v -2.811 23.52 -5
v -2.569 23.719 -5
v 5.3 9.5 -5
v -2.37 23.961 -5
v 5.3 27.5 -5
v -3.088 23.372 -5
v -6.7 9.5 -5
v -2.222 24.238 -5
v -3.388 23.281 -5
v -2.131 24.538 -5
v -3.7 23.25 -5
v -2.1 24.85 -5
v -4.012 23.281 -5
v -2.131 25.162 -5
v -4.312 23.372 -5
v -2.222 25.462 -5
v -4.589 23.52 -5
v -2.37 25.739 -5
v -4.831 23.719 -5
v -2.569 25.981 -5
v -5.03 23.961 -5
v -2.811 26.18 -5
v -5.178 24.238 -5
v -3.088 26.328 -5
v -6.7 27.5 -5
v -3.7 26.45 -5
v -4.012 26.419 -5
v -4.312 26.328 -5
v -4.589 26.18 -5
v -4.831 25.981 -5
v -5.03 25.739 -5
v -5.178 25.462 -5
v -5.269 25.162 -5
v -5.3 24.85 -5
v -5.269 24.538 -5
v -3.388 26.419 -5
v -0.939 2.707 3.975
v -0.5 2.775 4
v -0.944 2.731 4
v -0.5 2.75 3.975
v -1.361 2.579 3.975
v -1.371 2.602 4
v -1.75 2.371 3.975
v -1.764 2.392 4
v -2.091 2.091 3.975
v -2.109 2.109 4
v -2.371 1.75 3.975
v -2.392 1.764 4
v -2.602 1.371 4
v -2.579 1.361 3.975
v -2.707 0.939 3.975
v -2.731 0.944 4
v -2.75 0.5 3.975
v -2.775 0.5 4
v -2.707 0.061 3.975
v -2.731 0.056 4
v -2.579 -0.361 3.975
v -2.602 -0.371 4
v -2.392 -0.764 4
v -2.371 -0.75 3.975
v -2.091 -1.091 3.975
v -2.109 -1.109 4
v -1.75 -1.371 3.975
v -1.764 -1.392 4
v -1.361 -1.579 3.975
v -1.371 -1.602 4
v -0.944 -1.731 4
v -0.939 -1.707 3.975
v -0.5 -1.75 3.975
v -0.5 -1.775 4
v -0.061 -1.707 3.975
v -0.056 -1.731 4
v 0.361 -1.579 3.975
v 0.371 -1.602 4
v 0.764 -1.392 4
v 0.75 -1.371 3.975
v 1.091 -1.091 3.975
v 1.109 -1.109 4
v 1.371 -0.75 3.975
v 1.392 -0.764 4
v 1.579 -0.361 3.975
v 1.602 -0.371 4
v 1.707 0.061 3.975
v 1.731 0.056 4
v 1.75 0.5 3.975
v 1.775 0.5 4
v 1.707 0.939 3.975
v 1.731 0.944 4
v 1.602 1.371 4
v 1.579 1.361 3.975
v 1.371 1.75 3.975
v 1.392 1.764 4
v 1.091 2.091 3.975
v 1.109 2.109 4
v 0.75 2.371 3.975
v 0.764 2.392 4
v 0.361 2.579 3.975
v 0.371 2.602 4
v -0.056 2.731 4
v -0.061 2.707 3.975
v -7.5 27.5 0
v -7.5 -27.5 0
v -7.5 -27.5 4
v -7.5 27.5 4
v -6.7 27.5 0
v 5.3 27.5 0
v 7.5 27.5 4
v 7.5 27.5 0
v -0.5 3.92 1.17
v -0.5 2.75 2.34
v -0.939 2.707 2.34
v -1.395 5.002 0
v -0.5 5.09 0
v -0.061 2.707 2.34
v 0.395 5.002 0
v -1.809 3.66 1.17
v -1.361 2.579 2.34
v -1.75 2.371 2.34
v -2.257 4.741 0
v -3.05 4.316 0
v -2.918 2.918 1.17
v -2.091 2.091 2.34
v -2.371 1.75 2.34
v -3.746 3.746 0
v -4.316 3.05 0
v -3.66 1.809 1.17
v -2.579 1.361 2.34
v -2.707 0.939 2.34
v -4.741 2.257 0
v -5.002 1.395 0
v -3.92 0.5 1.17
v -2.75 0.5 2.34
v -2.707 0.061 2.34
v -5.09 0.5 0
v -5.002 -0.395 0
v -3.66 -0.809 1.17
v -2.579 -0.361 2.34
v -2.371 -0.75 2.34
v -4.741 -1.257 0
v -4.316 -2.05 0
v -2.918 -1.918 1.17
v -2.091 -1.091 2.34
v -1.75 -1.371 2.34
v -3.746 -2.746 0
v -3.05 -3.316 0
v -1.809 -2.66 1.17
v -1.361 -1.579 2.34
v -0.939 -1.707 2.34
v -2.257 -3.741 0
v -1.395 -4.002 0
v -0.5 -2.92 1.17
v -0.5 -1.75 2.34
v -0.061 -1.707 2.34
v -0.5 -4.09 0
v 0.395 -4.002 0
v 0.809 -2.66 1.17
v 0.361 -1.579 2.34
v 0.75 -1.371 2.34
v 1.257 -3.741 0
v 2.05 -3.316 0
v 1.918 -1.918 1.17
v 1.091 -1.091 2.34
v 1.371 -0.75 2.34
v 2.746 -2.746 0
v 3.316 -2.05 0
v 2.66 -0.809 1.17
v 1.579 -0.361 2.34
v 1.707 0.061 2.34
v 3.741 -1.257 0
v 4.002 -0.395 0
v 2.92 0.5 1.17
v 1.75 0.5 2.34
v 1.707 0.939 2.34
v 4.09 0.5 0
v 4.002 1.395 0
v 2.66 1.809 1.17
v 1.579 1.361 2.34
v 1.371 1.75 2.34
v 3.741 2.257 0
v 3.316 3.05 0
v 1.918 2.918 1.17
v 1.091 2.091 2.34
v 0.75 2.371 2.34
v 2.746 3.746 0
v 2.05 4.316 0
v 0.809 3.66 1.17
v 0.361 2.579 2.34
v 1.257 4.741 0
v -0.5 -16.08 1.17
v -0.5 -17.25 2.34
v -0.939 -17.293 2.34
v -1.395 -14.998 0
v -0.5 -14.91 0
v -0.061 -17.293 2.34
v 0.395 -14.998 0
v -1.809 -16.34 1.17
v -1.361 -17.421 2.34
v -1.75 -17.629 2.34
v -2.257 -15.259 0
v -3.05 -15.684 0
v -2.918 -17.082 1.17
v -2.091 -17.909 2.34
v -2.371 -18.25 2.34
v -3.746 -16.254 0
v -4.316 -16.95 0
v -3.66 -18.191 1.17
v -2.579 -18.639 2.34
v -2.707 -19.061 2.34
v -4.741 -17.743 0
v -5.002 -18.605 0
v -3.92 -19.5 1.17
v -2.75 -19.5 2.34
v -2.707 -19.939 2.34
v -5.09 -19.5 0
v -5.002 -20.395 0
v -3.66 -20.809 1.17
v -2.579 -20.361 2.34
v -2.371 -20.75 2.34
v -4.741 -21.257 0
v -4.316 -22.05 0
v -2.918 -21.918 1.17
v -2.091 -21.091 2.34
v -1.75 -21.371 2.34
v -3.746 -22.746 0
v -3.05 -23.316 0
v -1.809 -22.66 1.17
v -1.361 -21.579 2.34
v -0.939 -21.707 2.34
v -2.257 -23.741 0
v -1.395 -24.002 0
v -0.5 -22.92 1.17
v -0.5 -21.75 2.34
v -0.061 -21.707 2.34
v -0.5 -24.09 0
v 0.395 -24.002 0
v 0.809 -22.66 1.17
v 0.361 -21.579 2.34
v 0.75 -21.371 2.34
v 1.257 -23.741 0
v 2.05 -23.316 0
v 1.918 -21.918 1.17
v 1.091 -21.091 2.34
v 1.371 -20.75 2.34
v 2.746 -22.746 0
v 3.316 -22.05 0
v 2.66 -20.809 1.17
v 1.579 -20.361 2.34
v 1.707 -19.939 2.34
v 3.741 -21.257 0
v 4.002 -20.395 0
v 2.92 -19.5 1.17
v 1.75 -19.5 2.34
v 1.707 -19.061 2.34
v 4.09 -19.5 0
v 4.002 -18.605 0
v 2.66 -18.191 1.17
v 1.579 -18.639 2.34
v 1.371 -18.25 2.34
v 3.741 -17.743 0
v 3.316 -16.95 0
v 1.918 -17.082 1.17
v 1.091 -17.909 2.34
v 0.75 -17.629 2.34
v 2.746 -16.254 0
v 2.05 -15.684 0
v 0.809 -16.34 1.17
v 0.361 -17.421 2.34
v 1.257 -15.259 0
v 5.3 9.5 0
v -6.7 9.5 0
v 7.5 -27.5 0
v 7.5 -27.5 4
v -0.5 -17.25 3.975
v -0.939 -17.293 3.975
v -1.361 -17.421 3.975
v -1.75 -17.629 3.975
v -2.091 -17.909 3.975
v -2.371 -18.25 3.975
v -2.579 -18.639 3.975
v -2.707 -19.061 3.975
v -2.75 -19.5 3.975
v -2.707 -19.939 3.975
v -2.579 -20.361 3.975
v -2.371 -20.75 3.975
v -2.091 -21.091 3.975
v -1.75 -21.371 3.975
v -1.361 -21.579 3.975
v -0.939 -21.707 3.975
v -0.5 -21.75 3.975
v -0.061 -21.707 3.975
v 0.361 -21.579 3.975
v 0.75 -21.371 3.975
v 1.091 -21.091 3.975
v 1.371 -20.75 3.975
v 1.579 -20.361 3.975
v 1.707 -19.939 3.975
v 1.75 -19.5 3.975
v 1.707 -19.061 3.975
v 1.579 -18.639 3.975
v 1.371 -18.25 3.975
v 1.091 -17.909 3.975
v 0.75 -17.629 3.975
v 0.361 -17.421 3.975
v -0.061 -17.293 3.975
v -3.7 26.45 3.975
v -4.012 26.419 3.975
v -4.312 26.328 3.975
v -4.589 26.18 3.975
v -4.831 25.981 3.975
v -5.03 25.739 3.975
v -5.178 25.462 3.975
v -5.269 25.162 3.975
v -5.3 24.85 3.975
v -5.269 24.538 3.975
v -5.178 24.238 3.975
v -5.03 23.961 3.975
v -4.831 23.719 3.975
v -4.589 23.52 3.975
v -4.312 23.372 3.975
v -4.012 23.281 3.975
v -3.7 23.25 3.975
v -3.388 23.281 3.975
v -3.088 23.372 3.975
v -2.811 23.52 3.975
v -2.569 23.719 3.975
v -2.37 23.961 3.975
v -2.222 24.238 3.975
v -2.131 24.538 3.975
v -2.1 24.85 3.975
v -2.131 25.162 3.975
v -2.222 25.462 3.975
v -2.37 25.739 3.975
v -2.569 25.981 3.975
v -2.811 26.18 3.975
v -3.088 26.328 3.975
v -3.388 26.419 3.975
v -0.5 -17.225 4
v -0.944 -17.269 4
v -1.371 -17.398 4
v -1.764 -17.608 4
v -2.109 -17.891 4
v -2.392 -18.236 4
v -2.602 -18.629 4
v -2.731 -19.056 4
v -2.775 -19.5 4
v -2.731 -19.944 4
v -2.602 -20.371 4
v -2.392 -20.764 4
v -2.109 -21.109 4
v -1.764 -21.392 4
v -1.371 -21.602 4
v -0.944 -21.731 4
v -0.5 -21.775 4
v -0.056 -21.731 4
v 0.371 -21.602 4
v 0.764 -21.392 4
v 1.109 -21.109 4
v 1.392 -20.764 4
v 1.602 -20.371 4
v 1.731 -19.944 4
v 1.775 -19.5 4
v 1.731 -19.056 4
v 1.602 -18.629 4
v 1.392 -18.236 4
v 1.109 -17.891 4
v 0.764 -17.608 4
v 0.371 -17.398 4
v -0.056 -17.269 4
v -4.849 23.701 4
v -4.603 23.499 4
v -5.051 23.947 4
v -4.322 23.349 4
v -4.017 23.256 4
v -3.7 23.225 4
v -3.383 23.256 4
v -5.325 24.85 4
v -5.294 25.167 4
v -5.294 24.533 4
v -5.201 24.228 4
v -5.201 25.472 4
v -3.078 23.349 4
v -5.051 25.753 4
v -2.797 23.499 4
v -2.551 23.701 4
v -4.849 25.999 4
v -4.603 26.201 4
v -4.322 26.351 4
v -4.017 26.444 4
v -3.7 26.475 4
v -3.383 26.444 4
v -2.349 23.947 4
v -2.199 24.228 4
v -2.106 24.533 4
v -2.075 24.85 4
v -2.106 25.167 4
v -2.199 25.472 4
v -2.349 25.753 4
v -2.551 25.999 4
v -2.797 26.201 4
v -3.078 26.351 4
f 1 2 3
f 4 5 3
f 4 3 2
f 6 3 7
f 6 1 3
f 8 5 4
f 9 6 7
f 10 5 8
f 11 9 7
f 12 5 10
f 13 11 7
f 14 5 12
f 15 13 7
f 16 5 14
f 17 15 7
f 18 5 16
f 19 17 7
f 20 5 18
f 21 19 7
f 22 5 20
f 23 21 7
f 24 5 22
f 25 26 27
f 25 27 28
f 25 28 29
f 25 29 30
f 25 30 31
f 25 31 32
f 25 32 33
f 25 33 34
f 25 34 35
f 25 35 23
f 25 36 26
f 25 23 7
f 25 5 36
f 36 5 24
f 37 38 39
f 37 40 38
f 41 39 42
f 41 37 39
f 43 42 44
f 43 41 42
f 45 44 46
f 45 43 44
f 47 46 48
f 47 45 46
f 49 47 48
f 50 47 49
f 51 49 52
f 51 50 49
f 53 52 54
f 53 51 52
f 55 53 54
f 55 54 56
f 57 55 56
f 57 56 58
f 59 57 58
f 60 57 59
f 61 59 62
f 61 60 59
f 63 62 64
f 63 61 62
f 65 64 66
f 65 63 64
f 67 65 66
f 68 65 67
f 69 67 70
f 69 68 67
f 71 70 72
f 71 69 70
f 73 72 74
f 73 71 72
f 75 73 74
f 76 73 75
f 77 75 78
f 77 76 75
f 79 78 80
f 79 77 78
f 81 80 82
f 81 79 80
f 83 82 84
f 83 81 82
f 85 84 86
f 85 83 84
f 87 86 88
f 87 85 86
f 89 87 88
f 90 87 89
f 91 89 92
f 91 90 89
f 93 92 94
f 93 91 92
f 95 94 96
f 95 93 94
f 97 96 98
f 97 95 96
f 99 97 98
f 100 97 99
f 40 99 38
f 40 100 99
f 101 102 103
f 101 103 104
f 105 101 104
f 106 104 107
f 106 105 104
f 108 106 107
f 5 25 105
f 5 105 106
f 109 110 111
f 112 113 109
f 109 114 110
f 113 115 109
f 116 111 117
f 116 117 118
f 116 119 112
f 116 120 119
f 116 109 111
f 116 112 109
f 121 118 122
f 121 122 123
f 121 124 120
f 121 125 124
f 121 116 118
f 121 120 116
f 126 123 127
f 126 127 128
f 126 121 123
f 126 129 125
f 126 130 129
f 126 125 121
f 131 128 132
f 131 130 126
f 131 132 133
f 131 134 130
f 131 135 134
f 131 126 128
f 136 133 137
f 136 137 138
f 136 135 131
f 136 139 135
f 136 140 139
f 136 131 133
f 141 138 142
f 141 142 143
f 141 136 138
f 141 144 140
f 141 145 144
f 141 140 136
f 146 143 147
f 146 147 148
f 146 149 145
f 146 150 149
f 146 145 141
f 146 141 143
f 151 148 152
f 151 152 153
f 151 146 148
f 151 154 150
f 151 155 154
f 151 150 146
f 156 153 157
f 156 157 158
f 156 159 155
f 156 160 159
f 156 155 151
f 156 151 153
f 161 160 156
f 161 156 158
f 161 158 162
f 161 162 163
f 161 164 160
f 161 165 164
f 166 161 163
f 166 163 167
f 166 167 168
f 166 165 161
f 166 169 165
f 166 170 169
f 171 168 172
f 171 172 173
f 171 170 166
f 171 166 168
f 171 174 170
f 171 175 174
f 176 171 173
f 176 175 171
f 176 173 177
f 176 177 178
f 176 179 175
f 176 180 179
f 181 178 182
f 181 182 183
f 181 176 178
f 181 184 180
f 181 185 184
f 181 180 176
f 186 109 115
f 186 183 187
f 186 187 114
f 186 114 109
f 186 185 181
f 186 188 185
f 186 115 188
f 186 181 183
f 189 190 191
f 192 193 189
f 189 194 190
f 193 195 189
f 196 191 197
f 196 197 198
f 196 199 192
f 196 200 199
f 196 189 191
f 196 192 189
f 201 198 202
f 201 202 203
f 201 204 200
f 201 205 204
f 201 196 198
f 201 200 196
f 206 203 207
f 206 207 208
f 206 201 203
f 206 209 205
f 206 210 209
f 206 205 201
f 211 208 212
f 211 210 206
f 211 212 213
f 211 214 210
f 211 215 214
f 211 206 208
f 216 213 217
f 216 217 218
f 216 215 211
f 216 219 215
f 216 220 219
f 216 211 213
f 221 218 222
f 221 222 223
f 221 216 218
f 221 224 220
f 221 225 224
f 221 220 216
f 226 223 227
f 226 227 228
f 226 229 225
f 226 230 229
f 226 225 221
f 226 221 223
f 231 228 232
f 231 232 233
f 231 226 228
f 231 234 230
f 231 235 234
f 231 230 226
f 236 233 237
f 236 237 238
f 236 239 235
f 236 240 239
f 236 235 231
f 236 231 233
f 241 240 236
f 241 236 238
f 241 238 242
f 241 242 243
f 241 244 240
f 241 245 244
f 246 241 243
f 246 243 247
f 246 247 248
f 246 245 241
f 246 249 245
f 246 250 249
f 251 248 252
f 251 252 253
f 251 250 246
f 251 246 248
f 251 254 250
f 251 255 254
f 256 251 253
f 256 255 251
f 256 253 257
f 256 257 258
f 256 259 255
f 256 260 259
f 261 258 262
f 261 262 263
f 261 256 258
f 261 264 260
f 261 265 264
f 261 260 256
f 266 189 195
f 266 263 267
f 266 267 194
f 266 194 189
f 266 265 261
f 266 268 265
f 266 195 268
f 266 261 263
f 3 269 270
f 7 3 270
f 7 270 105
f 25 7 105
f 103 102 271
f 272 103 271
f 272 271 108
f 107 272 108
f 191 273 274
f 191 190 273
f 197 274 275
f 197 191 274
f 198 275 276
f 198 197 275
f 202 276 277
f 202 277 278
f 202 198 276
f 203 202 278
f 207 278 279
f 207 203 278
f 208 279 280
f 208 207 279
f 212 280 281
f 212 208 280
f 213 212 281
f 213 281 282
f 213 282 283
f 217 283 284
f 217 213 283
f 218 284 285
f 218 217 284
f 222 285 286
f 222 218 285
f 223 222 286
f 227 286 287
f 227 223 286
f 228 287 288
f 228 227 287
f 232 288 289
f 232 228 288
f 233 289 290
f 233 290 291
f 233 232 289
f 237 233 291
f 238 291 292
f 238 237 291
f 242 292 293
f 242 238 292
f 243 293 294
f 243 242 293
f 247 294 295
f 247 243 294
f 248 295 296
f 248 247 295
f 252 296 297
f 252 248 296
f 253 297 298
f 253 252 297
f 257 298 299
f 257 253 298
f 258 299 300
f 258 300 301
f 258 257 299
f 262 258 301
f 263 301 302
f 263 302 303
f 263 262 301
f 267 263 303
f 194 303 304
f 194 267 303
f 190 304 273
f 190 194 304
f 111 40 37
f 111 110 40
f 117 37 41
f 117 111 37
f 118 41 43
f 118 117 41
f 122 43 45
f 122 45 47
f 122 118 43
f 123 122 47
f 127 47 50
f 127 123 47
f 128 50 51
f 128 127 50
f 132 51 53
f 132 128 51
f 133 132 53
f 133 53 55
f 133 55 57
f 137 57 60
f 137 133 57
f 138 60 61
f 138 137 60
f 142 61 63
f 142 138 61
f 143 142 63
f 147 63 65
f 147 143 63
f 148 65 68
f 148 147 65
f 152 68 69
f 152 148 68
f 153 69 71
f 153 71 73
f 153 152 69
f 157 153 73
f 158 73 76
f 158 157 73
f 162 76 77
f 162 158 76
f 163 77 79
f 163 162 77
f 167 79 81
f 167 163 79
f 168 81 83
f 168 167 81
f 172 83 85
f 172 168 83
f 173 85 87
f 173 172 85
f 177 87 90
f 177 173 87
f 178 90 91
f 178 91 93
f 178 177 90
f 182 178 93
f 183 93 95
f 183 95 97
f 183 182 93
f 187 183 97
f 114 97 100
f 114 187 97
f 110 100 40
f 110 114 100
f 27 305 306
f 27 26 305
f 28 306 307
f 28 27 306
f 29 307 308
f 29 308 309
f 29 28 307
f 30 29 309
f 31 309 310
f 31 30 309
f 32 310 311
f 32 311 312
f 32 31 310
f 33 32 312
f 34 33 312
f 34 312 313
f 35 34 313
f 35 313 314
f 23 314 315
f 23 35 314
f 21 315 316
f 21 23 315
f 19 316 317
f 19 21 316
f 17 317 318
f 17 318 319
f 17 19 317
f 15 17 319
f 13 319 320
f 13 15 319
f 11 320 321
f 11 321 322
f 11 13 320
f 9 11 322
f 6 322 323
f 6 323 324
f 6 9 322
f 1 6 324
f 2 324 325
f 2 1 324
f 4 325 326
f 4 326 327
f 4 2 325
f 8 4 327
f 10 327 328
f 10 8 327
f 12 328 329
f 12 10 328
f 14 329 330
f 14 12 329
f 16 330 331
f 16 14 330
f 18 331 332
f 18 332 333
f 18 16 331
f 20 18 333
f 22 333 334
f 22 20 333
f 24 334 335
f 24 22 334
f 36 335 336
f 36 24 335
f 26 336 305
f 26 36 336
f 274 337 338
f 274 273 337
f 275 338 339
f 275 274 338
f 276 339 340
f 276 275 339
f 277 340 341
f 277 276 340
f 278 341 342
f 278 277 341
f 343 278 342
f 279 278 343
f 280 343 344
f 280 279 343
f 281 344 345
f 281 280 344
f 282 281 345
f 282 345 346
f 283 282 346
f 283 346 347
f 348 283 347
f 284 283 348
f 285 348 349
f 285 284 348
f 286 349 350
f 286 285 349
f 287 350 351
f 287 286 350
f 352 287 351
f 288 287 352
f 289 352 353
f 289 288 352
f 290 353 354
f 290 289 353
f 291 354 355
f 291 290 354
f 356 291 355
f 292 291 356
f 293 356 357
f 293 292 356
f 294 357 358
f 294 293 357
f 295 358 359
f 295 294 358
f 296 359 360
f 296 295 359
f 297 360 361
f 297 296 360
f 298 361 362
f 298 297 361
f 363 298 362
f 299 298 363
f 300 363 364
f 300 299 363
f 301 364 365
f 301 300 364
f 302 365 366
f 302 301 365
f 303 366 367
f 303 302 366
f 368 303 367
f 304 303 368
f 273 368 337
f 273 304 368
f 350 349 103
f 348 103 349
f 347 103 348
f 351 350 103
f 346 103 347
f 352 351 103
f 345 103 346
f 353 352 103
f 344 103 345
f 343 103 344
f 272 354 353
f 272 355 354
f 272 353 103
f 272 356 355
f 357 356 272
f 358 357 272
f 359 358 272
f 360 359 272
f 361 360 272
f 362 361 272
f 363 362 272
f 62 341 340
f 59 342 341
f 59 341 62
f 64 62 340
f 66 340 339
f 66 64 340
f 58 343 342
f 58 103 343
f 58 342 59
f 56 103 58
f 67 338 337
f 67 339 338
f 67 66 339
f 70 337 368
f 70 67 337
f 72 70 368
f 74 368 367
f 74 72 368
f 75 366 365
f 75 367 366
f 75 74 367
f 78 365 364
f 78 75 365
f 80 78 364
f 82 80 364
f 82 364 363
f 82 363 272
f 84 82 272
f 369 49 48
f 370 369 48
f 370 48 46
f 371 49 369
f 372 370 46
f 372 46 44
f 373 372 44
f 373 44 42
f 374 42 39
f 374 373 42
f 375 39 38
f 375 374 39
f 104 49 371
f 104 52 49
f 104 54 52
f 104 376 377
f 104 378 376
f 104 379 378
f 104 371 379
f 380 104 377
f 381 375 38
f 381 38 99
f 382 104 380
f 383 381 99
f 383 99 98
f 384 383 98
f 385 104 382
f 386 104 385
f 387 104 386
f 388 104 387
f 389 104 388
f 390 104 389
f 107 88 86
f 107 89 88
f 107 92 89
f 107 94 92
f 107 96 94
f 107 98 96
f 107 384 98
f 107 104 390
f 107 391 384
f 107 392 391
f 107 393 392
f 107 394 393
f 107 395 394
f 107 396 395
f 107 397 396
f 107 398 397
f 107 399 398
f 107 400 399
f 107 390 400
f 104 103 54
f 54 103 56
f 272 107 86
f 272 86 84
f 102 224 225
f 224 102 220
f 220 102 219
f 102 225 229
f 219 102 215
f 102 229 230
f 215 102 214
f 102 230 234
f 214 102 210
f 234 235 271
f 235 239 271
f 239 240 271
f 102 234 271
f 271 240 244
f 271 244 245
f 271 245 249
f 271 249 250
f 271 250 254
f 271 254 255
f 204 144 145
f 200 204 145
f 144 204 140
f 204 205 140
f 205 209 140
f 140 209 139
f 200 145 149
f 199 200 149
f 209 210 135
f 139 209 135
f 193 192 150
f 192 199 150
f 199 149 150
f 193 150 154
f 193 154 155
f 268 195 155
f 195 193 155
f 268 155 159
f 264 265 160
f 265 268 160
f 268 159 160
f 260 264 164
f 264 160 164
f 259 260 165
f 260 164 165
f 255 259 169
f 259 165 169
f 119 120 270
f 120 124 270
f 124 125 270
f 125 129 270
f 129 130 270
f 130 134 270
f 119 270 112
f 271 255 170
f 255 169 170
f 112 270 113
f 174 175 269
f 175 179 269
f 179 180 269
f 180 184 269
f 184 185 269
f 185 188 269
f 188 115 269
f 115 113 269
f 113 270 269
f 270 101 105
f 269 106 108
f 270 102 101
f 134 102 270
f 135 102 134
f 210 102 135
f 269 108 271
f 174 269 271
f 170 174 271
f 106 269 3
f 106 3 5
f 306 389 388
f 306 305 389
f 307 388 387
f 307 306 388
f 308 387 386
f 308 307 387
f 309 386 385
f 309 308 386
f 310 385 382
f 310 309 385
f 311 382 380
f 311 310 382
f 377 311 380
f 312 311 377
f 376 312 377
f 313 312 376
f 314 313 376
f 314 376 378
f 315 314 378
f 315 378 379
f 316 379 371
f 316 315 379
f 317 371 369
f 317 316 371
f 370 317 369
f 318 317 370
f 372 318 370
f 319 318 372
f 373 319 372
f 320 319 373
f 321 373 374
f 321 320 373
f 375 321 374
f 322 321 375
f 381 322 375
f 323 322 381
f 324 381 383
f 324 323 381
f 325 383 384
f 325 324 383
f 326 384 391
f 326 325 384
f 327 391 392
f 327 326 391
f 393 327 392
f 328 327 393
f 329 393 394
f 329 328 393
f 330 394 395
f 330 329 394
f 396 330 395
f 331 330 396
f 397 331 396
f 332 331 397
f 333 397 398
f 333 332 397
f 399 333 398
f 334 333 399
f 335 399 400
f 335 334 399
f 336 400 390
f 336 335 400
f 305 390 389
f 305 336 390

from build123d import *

# Parameters (mm, degrees)
SKETCH1_W                                    = 15
SKETCH1_H                                    = 55
BOSS_EXTRUDE1_DEPTH                          = 4
CSK_FOR_M4_HEX_SOCKET_COUNTERSUNK_HE_2_COUNT = 2
CSK_FOR_M4_HEX_SOCKET_COUNTERSUNK_HE_2_PITCH = 20
SKETCH15_W                                   = 12
SKETCH15_H                                   = 18
BOSS_EXTRUDE2_DEPTH                          = 5


with BuildPart() as part:
    # Sketch1 → Boss-Extrude1 (new body)
    with BuildSketch(Plane.XY):
        Rectangle(SKETCH1_W, SKETCH1_H)
    extrude(amount=BOSS_EXTRUDE1_DEPTH)

    # Sketch5 → CSK for M4 Hex Socket Countersunk Head Screw1 (revolve, cut)
    with BuildSketch(Plane(origin=(-0.5, 0.5, 0), x_dir=(0, 1, 0), z_dir=(1, 0, 0))):
        Polygon((0, 0), (0, 4), (2.275, 4), (2.25, 3.975), (2.25, 2.34), (4.59, 0), align=None)
    csk_for_m4_hex_socket_countersunk_head_s = revolve(axis=Axis((-0.5, 0.5, -6.35), (0, 0, 1)), mode=Mode.SUBTRACT)

    # CSK for M4 Hex Socket Countersunk He 2: CSK for M4 Hex Socket Countersunk Head Screw1 ×2
    with Locations(*[(0, -i * CSK_FOR_M4_HEX_SOCKET_COUNTERSUNK_HE_2_PITCH, 0) for i in range(1, CSK_FOR_M4_HEX_SOCKET_COUNTERSUNK_HE_2_COUNT)]):
        add(csk_for_m4_hex_socket_countersunk_head_s, mode=Mode.SUBTRACT)

    # Sketch15 → Boss-Extrude2 (add)
    with BuildSketch(Plane(origin=(0, 0, 0), x_dir=(-1, 0, 0), z_dir=(0, 0, -1))):
        with Locations((0.7, 18.5)):
            Rectangle(SKETCH15_W, SKETCH15_H)
    extrude(amount=BOSS_EXTRUDE2_DEPTH)

    # Sketch19 → M3 Clearance Hole1 (revolve, cut)
    with BuildSketch(Plane(origin=(-3.7, 24.85, -5), x_dir=(0, 1, 0), z_dir=(1, 0, 0))):
        Polygon((0, 0), (0, 9), (1.625, 9), (1.6, 8.975), (1.6, 0), align=None)
    revolve(axis=Axis((-3.7, 24.85, -11.35), (0, 0, 1)), mode=Mode.SUBTRACT)


solid = part.part
